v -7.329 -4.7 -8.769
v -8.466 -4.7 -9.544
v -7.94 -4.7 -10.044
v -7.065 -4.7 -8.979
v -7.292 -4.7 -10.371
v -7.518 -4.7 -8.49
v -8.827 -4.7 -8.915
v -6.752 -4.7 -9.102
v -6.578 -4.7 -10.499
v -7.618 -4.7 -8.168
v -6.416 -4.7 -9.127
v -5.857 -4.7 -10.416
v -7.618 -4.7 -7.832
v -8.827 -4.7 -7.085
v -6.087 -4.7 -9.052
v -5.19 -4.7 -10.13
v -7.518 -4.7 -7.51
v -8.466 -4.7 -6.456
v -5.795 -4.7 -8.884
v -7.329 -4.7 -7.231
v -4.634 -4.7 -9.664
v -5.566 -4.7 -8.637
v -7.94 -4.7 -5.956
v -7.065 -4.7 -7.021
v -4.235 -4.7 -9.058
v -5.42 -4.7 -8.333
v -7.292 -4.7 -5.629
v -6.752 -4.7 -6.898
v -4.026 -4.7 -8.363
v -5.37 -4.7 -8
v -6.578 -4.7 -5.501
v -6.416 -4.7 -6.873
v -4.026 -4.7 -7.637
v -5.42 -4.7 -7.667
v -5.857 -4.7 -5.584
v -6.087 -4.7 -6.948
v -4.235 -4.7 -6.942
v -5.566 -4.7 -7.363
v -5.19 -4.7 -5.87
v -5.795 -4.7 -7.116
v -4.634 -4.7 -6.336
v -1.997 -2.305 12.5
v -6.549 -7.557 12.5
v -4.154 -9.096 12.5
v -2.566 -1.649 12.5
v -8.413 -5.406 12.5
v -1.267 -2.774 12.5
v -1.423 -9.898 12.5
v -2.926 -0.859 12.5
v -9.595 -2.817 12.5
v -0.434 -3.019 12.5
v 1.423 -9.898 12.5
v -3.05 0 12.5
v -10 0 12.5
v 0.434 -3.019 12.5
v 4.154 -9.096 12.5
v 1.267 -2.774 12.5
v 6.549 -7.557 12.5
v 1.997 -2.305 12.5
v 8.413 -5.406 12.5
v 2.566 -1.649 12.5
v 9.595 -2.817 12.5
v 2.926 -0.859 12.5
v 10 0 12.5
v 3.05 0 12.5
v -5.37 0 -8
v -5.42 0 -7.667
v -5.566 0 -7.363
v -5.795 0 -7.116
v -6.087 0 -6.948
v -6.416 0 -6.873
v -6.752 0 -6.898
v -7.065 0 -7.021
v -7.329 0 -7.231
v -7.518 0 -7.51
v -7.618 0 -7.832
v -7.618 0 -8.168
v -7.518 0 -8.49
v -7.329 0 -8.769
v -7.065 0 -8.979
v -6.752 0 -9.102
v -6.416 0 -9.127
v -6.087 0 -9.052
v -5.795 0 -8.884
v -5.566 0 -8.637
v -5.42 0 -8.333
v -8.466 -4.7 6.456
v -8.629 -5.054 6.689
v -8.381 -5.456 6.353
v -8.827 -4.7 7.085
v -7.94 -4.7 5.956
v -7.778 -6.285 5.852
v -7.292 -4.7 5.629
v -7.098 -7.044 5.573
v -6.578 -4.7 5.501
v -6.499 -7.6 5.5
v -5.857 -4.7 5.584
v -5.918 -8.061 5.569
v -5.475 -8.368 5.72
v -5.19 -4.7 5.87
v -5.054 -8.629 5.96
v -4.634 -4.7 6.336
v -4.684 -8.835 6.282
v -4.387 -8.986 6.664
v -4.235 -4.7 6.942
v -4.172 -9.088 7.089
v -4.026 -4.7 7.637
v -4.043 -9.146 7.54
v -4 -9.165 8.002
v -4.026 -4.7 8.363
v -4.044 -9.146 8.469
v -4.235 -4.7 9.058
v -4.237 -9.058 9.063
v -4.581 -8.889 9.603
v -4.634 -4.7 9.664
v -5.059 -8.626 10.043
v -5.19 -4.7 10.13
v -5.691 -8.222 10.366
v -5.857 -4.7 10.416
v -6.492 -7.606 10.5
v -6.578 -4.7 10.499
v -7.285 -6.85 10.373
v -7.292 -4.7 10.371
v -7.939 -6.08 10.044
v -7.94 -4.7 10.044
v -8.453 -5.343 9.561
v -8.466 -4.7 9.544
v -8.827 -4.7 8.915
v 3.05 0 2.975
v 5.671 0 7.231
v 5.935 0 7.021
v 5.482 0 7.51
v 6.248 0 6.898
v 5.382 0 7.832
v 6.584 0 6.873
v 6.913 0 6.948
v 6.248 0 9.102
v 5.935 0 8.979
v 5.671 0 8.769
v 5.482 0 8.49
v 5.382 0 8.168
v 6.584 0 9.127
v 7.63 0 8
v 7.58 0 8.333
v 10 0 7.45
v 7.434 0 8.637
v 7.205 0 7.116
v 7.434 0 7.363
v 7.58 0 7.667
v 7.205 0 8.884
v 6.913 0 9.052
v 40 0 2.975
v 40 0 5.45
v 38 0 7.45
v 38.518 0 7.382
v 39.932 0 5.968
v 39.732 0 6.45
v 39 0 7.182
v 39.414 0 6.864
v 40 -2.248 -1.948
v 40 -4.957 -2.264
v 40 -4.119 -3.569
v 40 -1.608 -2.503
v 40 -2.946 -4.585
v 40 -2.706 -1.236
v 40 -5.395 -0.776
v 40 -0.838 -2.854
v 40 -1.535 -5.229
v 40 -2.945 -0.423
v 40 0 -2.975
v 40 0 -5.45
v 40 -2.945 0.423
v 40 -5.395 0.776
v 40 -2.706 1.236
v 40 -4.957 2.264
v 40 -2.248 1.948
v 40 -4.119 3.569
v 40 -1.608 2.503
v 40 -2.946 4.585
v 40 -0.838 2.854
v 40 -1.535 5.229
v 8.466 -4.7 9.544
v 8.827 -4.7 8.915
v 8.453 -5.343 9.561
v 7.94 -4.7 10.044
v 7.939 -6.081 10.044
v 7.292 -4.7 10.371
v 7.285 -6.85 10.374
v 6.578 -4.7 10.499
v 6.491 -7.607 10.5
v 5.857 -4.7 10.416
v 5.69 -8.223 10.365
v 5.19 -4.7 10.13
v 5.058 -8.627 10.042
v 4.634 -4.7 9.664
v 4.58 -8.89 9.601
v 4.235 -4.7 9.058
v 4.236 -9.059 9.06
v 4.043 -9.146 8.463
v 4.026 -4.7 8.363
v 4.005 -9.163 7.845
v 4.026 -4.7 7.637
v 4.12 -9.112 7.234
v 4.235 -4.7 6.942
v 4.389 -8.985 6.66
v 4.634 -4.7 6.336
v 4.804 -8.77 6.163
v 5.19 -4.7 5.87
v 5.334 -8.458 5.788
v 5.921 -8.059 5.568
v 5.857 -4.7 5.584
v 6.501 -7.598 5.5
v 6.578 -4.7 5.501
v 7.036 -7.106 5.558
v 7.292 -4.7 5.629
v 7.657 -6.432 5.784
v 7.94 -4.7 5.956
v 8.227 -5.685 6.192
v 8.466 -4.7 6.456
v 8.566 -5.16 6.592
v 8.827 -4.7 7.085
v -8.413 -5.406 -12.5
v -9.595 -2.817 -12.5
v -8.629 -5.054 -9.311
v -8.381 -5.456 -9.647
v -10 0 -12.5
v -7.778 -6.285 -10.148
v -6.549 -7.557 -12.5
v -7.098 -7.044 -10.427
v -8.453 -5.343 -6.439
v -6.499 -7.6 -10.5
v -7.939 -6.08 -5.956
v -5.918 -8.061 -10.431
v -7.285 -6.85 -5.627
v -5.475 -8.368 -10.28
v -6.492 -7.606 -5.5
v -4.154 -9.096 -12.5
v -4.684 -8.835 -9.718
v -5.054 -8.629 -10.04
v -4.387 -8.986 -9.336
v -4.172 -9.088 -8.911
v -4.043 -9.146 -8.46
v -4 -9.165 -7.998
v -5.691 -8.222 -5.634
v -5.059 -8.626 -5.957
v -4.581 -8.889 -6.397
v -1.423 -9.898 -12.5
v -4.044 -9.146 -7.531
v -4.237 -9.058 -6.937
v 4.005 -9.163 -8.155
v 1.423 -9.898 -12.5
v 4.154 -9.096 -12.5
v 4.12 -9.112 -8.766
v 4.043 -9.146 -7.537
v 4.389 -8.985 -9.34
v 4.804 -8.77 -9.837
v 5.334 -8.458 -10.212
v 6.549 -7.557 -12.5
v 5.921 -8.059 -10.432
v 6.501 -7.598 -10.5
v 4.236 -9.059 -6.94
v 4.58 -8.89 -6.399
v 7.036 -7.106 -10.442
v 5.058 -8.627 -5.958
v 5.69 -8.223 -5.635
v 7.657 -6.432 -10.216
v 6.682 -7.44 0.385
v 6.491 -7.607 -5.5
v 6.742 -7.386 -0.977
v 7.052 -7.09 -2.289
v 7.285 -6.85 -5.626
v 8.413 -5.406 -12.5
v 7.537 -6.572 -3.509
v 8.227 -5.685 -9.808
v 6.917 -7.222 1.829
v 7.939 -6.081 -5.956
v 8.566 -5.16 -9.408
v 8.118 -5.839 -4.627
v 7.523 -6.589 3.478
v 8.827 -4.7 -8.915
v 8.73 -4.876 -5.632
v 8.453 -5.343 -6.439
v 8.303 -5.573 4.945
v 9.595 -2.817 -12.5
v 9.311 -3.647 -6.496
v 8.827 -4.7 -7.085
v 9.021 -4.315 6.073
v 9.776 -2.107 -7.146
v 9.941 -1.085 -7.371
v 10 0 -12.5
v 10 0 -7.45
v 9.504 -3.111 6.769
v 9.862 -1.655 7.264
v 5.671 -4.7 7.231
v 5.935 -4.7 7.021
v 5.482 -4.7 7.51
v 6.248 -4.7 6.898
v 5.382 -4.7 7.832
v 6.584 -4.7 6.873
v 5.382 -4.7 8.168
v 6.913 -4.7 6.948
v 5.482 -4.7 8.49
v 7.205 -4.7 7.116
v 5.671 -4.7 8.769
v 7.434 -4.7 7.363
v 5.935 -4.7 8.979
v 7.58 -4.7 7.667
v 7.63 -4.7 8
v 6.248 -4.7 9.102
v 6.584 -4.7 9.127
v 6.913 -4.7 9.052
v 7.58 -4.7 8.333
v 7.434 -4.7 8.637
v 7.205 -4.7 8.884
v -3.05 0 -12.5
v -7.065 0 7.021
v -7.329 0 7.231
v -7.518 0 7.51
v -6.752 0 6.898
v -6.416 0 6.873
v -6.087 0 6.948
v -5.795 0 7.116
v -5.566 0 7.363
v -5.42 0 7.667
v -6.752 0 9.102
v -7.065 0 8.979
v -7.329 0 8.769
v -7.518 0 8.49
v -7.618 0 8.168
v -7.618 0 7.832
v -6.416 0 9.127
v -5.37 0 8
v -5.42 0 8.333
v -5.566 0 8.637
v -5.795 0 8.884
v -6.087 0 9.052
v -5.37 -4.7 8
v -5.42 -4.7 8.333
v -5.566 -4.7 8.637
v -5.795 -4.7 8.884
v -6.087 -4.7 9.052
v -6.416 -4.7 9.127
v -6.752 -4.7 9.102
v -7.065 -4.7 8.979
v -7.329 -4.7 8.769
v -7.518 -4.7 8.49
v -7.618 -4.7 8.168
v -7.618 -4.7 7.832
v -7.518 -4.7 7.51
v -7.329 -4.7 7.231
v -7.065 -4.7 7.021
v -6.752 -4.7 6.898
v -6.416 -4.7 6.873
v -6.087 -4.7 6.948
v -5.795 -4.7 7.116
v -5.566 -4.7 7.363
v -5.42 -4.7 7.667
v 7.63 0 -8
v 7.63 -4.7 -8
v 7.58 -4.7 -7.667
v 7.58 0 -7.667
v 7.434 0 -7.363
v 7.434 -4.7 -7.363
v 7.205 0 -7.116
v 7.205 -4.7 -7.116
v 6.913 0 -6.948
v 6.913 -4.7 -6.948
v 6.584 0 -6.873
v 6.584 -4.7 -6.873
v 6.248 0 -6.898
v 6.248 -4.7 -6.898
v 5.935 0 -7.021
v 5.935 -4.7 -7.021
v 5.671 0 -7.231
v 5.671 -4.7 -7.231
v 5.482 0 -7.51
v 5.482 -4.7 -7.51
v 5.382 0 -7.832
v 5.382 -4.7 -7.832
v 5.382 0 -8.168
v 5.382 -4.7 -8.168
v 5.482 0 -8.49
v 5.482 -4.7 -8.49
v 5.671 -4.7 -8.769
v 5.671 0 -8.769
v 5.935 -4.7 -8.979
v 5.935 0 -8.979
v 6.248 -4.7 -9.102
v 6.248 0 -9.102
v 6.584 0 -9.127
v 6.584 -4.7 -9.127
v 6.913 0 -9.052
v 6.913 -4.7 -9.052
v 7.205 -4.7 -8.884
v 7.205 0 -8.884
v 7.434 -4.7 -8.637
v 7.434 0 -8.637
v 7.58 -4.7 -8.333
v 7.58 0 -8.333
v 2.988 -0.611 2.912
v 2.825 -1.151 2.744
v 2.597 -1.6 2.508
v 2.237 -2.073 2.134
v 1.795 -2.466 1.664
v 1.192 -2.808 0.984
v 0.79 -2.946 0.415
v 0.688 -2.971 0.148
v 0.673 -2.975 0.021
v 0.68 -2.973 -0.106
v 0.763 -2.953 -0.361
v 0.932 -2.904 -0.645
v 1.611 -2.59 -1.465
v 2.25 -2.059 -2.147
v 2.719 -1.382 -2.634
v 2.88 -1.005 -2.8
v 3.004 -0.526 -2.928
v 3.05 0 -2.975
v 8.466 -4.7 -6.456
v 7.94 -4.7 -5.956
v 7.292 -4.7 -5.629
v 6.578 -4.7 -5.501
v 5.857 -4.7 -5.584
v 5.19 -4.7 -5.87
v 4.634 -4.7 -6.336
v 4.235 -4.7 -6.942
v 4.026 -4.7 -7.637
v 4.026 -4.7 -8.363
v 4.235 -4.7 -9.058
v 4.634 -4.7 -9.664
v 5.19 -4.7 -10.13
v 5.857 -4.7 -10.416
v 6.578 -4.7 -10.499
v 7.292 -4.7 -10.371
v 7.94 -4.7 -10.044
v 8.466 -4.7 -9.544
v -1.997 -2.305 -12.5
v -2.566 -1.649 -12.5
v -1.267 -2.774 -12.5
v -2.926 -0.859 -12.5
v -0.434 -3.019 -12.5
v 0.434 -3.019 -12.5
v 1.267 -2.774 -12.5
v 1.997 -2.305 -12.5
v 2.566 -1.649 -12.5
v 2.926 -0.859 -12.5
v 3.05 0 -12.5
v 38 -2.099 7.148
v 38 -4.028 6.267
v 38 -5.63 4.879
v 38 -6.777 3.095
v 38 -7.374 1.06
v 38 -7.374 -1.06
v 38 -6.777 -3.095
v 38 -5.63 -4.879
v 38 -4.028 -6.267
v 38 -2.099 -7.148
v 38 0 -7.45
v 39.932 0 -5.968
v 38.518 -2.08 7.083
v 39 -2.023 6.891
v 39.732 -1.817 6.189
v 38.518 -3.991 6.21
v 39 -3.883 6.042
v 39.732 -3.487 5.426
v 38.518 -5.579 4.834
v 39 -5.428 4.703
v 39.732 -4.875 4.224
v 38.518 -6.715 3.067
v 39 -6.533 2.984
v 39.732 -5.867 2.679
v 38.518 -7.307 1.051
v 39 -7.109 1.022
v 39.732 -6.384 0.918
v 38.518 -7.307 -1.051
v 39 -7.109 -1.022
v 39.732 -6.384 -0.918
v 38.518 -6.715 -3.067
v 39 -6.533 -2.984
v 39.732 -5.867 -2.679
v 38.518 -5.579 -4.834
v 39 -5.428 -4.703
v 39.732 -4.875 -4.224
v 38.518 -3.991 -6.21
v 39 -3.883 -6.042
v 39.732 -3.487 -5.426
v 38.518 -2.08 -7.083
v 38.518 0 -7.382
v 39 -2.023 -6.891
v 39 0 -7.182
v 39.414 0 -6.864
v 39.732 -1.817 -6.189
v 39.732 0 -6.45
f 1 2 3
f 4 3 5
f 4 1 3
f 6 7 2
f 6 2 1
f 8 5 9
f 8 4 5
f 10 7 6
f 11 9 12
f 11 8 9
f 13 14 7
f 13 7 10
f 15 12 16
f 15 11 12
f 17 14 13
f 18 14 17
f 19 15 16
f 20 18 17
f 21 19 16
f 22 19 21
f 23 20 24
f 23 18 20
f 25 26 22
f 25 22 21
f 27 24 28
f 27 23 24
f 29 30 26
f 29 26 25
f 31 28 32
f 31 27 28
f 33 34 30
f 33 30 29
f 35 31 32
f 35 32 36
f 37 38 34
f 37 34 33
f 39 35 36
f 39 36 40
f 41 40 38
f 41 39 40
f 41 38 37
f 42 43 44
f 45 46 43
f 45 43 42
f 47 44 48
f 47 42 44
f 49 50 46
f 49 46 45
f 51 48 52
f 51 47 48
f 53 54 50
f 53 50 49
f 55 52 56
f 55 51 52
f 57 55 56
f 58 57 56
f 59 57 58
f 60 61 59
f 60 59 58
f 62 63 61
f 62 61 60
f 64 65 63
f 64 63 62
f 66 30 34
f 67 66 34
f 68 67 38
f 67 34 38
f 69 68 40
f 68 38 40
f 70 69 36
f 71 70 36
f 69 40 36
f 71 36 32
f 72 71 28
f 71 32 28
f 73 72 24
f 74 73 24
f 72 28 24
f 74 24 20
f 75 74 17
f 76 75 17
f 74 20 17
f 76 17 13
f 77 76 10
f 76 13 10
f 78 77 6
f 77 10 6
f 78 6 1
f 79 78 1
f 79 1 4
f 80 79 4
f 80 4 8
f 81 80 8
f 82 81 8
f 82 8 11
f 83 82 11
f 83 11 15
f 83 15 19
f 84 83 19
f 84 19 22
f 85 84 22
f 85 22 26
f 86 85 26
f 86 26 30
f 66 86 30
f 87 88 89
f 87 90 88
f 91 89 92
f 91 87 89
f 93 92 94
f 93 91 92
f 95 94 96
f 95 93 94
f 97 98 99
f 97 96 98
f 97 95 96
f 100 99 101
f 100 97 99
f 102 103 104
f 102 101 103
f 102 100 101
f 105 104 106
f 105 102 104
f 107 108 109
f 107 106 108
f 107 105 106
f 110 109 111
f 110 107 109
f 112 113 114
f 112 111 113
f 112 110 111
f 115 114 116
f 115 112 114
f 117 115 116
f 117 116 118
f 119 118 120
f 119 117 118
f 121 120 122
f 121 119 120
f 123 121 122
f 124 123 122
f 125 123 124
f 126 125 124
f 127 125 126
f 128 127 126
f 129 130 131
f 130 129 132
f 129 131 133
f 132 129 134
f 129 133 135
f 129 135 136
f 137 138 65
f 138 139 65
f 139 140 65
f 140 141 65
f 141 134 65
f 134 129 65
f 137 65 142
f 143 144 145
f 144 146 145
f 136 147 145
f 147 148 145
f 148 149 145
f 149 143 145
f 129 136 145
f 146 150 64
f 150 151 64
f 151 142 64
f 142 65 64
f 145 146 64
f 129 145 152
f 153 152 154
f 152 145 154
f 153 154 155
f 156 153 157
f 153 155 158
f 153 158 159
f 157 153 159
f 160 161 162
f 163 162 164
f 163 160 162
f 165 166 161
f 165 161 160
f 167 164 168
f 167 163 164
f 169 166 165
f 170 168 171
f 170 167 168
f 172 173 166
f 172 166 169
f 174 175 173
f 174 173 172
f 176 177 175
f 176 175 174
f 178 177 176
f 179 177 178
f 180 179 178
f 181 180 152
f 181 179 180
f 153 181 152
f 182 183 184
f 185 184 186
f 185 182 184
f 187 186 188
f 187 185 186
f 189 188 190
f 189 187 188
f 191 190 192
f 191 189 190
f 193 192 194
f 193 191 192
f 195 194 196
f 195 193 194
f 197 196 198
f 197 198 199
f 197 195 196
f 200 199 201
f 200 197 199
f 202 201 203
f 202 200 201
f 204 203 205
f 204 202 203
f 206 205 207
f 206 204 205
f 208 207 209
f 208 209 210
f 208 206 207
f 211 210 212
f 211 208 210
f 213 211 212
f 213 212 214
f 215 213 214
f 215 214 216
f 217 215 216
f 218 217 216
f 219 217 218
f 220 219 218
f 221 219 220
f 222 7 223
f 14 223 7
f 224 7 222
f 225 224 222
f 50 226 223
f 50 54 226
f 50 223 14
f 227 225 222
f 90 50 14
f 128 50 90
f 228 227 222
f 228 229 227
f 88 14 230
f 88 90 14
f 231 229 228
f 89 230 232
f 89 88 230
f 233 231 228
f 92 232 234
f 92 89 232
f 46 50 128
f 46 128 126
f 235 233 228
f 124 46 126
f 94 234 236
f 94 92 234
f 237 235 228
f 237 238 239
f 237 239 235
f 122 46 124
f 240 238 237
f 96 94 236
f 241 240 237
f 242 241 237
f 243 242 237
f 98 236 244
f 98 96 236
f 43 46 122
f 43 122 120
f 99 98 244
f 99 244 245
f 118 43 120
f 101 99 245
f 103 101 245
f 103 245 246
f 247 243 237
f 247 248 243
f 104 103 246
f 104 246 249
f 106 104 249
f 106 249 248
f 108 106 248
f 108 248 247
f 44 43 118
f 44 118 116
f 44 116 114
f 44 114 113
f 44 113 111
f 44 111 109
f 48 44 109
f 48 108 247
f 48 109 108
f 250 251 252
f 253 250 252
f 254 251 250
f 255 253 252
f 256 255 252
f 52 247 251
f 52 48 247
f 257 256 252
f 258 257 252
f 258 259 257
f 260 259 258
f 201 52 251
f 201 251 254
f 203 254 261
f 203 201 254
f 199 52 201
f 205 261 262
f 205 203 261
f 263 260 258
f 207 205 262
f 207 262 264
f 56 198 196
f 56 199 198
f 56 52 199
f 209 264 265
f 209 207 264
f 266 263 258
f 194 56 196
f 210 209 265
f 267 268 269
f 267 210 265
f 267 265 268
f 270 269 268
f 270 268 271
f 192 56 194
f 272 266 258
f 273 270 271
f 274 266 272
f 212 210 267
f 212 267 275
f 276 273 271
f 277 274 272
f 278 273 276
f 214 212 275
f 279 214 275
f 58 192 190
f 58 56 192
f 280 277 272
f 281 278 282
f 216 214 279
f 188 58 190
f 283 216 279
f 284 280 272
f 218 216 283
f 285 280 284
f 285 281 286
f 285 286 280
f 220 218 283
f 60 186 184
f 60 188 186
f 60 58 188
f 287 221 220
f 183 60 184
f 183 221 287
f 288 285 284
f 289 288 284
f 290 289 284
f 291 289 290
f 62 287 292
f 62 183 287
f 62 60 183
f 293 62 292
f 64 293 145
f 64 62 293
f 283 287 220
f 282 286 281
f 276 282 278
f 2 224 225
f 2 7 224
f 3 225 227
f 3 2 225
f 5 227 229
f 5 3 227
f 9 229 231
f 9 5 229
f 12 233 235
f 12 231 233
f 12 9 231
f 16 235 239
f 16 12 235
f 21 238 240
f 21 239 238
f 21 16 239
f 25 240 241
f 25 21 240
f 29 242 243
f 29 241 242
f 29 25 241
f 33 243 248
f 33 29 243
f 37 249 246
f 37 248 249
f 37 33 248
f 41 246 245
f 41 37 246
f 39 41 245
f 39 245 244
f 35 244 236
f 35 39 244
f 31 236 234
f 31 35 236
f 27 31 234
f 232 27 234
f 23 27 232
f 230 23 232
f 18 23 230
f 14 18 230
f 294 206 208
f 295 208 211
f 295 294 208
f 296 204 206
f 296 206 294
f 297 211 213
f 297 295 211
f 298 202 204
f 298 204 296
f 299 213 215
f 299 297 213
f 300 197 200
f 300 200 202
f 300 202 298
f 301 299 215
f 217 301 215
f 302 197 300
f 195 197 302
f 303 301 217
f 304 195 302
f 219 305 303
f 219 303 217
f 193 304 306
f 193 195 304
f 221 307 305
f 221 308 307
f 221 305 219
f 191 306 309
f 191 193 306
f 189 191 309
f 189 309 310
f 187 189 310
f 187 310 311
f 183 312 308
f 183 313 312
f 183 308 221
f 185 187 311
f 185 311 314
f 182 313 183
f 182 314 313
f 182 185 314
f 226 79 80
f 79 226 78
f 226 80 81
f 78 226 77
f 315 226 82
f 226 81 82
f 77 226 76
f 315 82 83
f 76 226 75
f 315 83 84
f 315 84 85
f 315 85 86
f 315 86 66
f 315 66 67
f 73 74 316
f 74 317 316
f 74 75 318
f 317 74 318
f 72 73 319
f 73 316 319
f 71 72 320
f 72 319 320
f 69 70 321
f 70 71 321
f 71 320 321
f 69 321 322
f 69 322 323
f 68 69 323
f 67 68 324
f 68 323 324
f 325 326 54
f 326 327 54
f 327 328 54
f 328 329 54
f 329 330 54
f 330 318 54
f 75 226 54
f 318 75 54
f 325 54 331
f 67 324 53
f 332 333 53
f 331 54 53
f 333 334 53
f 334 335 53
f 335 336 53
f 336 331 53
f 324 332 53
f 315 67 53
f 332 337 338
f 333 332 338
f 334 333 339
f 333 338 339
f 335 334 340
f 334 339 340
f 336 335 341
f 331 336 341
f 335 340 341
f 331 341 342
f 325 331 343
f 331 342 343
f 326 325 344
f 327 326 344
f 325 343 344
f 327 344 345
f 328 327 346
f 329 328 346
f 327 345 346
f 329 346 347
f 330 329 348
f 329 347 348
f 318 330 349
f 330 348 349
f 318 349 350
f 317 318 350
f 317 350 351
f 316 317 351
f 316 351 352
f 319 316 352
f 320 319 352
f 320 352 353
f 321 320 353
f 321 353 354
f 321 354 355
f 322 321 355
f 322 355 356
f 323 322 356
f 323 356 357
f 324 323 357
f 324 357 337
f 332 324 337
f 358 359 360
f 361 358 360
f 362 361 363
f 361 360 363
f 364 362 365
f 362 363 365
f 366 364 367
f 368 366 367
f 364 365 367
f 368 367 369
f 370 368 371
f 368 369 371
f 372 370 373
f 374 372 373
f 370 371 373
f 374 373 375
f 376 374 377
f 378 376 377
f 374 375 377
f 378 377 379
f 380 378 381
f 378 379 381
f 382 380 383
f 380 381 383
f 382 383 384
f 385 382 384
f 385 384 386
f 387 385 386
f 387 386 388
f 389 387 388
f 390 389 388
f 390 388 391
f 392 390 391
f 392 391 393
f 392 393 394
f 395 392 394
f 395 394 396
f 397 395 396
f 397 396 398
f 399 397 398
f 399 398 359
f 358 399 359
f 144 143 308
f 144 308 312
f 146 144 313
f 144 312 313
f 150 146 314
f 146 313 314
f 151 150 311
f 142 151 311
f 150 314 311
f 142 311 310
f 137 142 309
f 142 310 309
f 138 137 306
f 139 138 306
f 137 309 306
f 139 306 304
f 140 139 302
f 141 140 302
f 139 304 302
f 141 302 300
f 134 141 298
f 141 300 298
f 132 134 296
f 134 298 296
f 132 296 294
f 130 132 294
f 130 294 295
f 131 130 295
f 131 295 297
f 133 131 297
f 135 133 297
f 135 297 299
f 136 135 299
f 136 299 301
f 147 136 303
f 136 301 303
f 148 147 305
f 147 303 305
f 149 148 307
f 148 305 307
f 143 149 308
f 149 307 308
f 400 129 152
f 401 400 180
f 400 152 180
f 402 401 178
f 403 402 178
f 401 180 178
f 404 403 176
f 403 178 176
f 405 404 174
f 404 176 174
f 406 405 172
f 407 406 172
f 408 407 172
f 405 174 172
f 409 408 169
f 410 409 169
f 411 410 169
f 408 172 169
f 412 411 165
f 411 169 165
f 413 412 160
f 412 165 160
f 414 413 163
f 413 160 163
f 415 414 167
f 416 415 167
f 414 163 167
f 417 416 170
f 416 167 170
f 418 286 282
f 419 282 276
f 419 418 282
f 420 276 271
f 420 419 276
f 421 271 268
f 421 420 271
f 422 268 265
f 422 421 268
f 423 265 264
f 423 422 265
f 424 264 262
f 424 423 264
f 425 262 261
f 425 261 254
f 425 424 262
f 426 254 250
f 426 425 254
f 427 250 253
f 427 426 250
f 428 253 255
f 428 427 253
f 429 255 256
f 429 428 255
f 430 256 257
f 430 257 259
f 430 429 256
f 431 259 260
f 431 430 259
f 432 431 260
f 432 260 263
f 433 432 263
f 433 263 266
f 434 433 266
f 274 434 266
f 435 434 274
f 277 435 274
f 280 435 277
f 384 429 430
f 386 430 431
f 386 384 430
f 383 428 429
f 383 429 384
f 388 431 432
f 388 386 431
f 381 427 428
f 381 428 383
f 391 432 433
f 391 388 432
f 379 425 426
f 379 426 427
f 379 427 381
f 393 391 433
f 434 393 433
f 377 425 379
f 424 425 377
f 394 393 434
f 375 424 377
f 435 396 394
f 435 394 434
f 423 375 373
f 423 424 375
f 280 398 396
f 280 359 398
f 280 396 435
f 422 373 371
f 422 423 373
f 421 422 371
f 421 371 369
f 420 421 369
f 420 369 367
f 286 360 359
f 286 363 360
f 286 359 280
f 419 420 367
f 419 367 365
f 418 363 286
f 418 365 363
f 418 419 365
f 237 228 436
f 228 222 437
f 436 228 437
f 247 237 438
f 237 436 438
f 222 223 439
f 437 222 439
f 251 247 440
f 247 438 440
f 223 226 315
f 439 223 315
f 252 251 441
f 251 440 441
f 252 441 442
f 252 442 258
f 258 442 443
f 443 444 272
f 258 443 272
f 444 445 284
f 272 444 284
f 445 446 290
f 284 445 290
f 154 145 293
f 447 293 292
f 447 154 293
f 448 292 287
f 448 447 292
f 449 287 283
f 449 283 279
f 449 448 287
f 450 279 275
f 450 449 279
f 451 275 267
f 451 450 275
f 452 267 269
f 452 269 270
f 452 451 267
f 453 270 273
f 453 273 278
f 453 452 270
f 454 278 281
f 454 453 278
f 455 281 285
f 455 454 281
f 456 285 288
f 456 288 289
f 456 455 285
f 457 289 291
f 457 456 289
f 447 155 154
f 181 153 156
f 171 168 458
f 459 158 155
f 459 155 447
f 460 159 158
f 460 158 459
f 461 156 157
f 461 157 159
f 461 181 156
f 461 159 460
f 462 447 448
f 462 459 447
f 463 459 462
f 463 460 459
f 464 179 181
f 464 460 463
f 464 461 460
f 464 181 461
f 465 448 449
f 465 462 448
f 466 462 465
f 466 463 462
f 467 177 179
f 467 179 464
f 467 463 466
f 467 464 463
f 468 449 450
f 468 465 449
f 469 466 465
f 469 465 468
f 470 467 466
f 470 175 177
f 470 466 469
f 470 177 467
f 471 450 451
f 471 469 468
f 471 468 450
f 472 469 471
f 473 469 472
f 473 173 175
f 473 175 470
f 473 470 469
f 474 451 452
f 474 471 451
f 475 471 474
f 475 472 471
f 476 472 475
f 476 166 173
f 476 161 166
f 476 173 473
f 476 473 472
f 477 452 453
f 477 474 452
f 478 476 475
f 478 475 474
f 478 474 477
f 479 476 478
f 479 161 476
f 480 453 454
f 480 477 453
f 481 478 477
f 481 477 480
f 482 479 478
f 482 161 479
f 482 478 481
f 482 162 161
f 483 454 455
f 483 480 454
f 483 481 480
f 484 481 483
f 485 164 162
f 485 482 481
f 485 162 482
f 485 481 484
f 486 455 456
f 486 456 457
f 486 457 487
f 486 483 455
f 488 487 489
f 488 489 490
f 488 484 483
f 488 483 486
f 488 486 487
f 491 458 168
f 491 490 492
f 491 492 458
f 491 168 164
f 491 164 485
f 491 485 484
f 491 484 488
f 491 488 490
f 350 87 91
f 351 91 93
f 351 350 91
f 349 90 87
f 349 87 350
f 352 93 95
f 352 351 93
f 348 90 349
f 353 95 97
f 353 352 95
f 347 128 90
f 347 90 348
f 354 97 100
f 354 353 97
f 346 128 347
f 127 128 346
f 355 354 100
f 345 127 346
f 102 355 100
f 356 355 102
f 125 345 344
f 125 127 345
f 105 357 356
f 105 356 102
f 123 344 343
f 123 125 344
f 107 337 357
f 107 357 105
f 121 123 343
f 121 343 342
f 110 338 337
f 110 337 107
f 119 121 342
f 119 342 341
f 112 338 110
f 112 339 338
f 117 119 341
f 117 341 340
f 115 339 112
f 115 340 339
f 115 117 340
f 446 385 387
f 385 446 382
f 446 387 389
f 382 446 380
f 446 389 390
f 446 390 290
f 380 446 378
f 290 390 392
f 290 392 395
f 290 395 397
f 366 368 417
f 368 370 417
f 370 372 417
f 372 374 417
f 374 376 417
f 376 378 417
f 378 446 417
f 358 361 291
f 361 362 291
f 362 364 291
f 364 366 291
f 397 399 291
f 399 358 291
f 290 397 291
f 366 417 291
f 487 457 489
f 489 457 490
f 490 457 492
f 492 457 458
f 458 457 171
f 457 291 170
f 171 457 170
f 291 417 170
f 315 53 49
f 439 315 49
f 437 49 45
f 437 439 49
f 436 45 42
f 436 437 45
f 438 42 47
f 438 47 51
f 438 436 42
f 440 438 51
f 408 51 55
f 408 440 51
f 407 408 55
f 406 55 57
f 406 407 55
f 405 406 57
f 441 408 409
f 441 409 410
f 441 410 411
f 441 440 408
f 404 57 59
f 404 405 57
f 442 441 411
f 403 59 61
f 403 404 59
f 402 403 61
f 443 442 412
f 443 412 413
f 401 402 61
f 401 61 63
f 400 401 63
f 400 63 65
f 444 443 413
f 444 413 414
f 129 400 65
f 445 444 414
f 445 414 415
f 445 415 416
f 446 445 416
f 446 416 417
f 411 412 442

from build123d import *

# Parameters (mm, degrees)
F0_R      = 10
F0_R_2    = 3.05
F1_DEPTH  = 12.5
F3_R      = 7.45
F4_DEPTH  = 33.3293554535
F5_R      = 2.975
F6_DEPTH  = 39.3287836491
F7_R      = 2
F8_R      = 1.1303
F9_DEPTH  = 12.5
F11_R     = 2.5
F12_DEPTH = 25
F13_W     = 67.0658163726
F13_H     = 16.5084768087
F14_DEPTH = 12.5


with BuildPart() as f1:
    # F0 (on Top) → F1 (new body, symmetric)
    with BuildSketch(Plane.XY):
        Circle(F0_R)
        Circle(F0_R_2, mode=Mode.SUBTRACT)
    extrude(amount=F1_DEPTH, both=True)

    # F3 (on offset) → F4 (join, through all)
    with BuildSketch(Plane.YZ.offset(40)):
        Circle(F3_R)
    extrude(amount=-F4_DEPTH)

    # F5 (on face) → F6 (cut, through all)
    with BuildSketch(Plane.YZ.offset(40)):
        Circle(F5_R)
    extrude(amount=-F6_DEPTH, mode=Mode.SUBTRACT)

    # F7
    f7_edges = [f1.edges().sort_by_distance(p)[0] for p in [
        (40, -7.45, 0),
    ]]
    fillet(f7_edges, radius=F7_R)

    # F8 (on Front) → F9 (cut, symmetric)
    with BuildSketch(Plane.XZ):
        with Locations((-6.5, -8)):
            Circle(F8_R)
        with Locations((6.5, -8)):
            Circle(F8_R)
        with Locations((-6.5, 8)):
            Circle(F8_R)
        with Locations((6.5, 8)):
            Circle(F8_R)
    extrude(amount=F9_DEPTH, both=True, mode=Mode.SUBTRACT)

    # F11 (on offset) → F12 (cut)
    with BuildSketch(Plane.XZ.offset(4.7)):
        with Locations((-6.5, 8)):
            Circle(F11_R)
        with Locations((6.5, 8)):
            Circle(F11_R)
        with Locations((-6.5, -8)):
            Circle(F11_R)
        with Locations((6.5, -8)):
            Circle(F11_R)
    extrude(amount=F12_DEPTH, mode=Mode.SUBTRACT)

    # F13 (on Top) → F14 (cut, symmetric)
    with BuildSketch(Plane.XY):
        with Locations((14.590991661, 8.2542384043)):
            Rectangle(F13_W, F13_H)
    extrude(amount=F14_DEPTH, both=True, mode=Mode.SUBTRACT)


solid = f1.part
